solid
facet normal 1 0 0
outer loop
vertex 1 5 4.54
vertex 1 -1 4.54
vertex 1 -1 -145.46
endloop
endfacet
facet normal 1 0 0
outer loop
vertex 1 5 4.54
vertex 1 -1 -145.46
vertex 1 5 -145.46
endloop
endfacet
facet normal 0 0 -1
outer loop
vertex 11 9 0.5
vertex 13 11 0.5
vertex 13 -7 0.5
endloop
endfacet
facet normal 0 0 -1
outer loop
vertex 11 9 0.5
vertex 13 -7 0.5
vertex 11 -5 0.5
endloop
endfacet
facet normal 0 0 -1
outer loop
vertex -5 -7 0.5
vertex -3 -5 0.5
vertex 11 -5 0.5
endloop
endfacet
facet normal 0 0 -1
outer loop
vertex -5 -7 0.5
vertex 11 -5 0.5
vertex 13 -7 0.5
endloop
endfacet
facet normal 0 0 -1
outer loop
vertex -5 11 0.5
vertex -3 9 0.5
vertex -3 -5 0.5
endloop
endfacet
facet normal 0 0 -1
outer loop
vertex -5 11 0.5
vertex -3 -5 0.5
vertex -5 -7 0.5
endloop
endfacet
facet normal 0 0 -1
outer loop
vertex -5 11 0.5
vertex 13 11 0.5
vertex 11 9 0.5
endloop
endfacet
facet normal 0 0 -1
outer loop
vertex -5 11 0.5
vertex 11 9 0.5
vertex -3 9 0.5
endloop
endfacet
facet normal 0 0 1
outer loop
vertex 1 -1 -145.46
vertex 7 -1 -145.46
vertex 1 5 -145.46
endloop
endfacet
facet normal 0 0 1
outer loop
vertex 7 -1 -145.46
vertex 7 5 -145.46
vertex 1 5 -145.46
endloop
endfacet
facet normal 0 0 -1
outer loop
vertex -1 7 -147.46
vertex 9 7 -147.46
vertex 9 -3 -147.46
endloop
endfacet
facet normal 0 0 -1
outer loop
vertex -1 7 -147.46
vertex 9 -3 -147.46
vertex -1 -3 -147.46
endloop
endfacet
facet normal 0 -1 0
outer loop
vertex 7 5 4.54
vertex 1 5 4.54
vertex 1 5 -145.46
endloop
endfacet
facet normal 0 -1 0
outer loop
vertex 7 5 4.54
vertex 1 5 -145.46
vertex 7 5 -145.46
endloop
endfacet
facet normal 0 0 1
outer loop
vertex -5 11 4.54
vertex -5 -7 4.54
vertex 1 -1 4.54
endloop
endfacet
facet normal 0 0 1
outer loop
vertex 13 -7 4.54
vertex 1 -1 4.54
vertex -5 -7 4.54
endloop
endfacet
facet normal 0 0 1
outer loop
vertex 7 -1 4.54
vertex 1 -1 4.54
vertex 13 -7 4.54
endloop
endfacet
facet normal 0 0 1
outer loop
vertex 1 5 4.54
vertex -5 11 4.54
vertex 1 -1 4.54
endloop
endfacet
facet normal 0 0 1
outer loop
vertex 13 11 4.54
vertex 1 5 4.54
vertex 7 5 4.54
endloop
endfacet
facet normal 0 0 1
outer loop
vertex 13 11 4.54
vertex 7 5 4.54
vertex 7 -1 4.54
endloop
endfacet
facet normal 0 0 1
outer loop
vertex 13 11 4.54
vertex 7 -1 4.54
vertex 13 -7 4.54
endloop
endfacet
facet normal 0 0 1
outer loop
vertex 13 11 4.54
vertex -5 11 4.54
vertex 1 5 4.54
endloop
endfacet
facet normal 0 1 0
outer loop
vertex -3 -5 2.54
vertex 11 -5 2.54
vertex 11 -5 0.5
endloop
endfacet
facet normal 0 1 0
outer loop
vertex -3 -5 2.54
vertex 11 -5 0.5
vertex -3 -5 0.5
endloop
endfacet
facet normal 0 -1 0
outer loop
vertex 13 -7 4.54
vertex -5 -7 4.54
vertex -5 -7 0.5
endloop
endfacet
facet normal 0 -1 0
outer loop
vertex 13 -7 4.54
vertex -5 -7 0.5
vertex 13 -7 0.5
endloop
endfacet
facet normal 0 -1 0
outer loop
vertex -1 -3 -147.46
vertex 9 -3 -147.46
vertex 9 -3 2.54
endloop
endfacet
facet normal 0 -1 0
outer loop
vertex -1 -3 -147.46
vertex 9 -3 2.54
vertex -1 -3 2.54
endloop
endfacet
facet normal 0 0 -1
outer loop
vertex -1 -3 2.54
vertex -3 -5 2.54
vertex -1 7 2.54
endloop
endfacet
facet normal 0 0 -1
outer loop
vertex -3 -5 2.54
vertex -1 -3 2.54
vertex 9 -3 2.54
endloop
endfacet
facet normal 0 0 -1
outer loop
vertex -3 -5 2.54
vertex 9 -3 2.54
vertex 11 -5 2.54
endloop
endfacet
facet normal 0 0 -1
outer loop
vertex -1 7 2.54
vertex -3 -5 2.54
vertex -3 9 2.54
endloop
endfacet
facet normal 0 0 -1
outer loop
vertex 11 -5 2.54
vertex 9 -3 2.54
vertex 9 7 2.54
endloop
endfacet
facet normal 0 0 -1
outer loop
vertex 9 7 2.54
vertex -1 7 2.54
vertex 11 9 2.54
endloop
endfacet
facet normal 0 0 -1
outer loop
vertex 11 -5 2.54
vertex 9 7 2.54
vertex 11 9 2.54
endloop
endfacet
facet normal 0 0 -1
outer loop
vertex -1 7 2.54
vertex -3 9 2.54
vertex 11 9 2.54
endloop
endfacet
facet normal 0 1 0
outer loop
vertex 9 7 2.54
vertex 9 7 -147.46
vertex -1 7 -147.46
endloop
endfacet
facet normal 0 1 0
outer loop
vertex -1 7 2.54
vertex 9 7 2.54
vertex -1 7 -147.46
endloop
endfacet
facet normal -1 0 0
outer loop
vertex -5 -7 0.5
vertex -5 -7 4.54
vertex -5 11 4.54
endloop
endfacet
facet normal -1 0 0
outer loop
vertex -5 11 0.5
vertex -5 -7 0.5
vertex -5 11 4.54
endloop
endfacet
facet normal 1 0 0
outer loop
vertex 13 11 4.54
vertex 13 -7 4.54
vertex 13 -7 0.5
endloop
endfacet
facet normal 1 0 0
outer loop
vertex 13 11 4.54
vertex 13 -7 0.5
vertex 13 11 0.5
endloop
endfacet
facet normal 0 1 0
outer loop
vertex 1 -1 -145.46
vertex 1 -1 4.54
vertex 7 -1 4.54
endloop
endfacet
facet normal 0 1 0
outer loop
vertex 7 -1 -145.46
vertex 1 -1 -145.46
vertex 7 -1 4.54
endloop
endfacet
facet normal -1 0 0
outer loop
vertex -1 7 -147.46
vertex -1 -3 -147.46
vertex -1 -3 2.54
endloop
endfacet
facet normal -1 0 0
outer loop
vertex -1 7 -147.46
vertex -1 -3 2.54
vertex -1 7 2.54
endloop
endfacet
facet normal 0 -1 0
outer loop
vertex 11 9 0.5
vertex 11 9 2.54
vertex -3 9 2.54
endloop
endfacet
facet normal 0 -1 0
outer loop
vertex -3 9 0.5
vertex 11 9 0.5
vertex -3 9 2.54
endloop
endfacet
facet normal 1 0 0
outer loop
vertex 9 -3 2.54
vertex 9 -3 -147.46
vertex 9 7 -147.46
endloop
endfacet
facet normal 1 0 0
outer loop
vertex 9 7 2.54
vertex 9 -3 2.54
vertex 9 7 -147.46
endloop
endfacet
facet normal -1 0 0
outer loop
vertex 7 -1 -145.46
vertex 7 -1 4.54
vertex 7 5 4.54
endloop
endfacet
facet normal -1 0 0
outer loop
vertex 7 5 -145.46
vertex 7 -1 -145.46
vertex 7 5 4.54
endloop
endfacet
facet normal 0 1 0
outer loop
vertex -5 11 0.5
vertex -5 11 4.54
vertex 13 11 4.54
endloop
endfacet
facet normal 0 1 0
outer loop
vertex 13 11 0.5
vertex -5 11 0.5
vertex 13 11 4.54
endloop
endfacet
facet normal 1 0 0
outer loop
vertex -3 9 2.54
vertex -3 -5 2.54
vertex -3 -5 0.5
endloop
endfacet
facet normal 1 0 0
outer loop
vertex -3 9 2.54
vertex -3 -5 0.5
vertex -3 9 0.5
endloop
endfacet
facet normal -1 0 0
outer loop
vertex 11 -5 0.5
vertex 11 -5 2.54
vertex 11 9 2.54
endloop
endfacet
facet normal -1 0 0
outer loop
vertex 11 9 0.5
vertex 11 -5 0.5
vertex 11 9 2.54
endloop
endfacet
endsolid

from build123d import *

# Parameters (mm, degrees)
SKETCH1_W            = 10
SKETCH1_H            = 10
SKETCH1_W_2          = 6
SKETCH1_H_2          = 6
BOSS_EXTRUDE1_DEPTH  = 2.54
BOSS_EXTRUDE4_DEPTH  = 2.54
CUT_EXTRUDE4_DEPTH   = 2.54
BOSS_EXTRUDE6_DEPTH  = 2.54
BOSS_EXTRUDE7_DEPTH  = 2.54
SKETCH8_W            = 16
SKETCH8_H            = 16
SKETCH8_W_2          = 12
SKETCH8_H_2          = 12
CUT_EXTRUDE5_DEPTH   = 0.5
SKETCH9_W            = 8
SKETCH9_H            = 8
BOSS_EXTRUDE8_DEPTH  = 0.5
SKETCH10_W           = 12
SKETCH10_H           = 12
SKETCH10_W_2         = 8
SKETCH10_H_2         = 8
CUT_EXTRUDE6_DEPTH   = 10
SKETCH11_W           = 16
SKETCH11_H           = 16
SKETCH11_W_2         = 8
SKETCH11_H_2         = 8
BOSS_EXTRUDE9_DEPTH  = 2
SKETCH13_W           = 8
SKETCH13_H           = 8
CUT_EXTRUDE7_DEPTH   = 2
SKETCH14_W           = 10
SKETCH14_H           = 10
SKETCH14_W_2         = 6
SKETCH14_H_2         = 6
CUT_EXTRUDE8_DEPTH   = 2
SKETCH16_W           = 14
SKETCH16_H           = 14
SKETCH16_W_2         = 12
SKETCH16_H_2         = 12
CUT_EXTRUDE12_DEPTH  = 10
SKETCH17_W           = 18
SKETCH17_H           = 18
SKETCH17_W_2         = 16
SKETCH17_H_2         = 16
BOSS_EXTRUDE10_DEPTH = 4
SKETCH18_W           = 18
SKETCH18_H           = 18
SKETCH18_W_2         = 16
SKETCH18_H_2         = 16
BOSS_EXTRUDE11_DEPTH = 1
SKETCH19_W           = 10
SKETCH19_H           = 10
SKETCH19_W_2         = 6
SKETCH19_H_2         = 6
BOSS_EXTRUDE12_DEPTH = 150
SKETCH20_W           = 10
SKETCH20_H           = 10
BOSS_EXTRUDE13_DEPTH = 2


with BuildPart() as part:
    # Sketch1 → Boss-Extrude1 (new body)
    with BuildSketch(Plane.XY):
        with Locations((3, 3)):
            Rectangle(SKETCH1_W, SKETCH1_H)
        with Locations((3, 3)):
            Rectangle(SKETCH1_W_2, SKETCH1_H_2, mode=Mode.SUBTRACT)
    extrude(amount=BOSS_EXTRUDE1_DEPTH)

    # Sketch2 → Boss-Extrude4 (add)
    with BuildSketch(Plane(origin=(0, 0, 0), x_dir=(-1, 0, 0), z_dir=(0, 0, -1))):
        Polygon((-8, 8), (-8, -2), (2, -2), (2, -4), (-10, -4), (-10, 8), align=None)
    extrude(amount=-BOSS_EXTRUDE4_DEPTH)

    # Sketch5 → Cut-Extrude4 (cut)
    with BuildSketch(Plane(origin=(0, 0, 0), x_dir=(-1, 0, 0), z_dir=(0, 0, -1))):
        Polygon((-6, 6), (-6, 0), (0, 0), (0, -2), (-8, -2), (-8, 6), align=None)
    extrude(amount=-CUT_EXTRUDE4_DEPTH, mode=Mode.SUBTRACT)

    # Sketch6 → Boss-Extrude6 (add)
    with BuildSketch(Plane(origin=(0, 0, 0), x_dir=(-1, 0, 0), z_dir=(0, 0, -1))):
        Polygon((-10, 8), (-10, -4), (2, -4), (2, -6), (-12, -6), (-12, 8), align=None)
    extrude(amount=-BOSS_EXTRUDE6_DEPTH)

    # Sketch7 → Boss-Extrude7 (add)
    with BuildSketch(Plane(origin=(0, 0, 0), x_dir=(-1, 0, 0), z_dir=(0, 0, -1))):
        Polygon((-12, 8), (2, 8), (2, -6), (4, -6), (4, 10), (-12, 10), align=None)
    extrude(amount=-BOSS_EXTRUDE7_DEPTH)

    # Sketch8 → Cut-Extrude5 (cut)
    with BuildSketch(Plane(origin=(0, 0, 0), x_dir=(-1, 0, 0), z_dir=(0, 0, -1))):
        with Locations((-4, 2)):
            Rectangle(SKETCH8_W, SKETCH8_H)
        with Locations((-4, 2)):
            Rectangle(SKETCH8_W_2, SKETCH8_H_2, mode=Mode.SUBTRACT)
    extrude(amount=-CUT_EXTRUDE5_DEPTH, mode=Mode.SUBTRACT)

    # Sketch10 → Cut-Extrude6 (cut)
    with BuildSketch(Plane(origin=(0, 0, 0), x_dir=(-1, 0, 0), z_dir=(0, 0, -1))):
        with Locations((-4, 2)):
            Rectangle(SKETCH10_W, SKETCH10_H)
        with Locations((-4, 2)):
            Rectangle(SKETCH10_W_2, SKETCH10_H_2, mode=Mode.SUBTRACT)
    extrude(amount=-CUT_EXTRUDE6_DEPTH, mode=Mode.SUBTRACT)

    # Sketch11 → Boss-Extrude9 (add)
    with BuildSketch(Plane.XY.offset(2.54)):
        with Locations((4, 2)):
            Rectangle(SKETCH11_W, SKETCH11_H)
        with Locations((4, 2)):
            Rectangle(SKETCH11_W_2, SKETCH11_H_2, mode=Mode.SUBTRACT)
    extrude(amount=BOSS_EXTRUDE9_DEPTH)

    # Sketch14 → Cut-Extrude8 (cut)
    with BuildSketch(Plane(origin=(0, 0, 2.54), x_dir=(-1, 0, 0), z_dir=(0, 0, -1))):
        with Locations((-4, 2)):
            Rectangle(SKETCH14_W, SKETCH14_H)
        with Locations((-4, 2)):
            Rectangle(SKETCH14_W_2, SKETCH14_H_2, mode=Mode.SUBTRACT)
    extrude(amount=-CUT_EXTRUDE8_DEPTH, mode=Mode.SUBTRACT)

    # Sketch16 → Cut-Extrude12 (cut)
    with BuildSketch(Plane(origin=(0, 0, 2.54), x_dir=(-1, 0, 0), z_dir=(0, 0, -1))):
        with Locations((-4, 2)):
            Rectangle(SKETCH16_W, SKETCH16_H)
        with Locations((-4, 2)):
            Rectangle(SKETCH16_W_2, SKETCH16_H_2, mode=Mode.SUBTRACT)
    extrude(amount=CUT_EXTRUDE12_DEPTH, mode=Mode.SUBTRACT)

    # Sketch17 → Boss-Extrude10 (add)
    with BuildSketch(Plane(origin=(0, 0, 0.5), x_dir=(-1, 0, 0), z_dir=(0, 0, -1))):
        with Locations((-4, 2)):
            Rectangle(SKETCH17_W, SKETCH17_H)
        with Locations((-4, 2)):
            Rectangle(SKETCH17_W_2, SKETCH17_H_2, mode=Mode.SUBTRACT)
    extrude(amount=-BOSS_EXTRUDE10_DEPTH)

    # Sketch18 → Boss-Extrude11 (add)
    with BuildSketch(Plane.XY.offset(4.54)):
        with Locations((4, 2)):
            Rectangle(SKETCH18_W, SKETCH18_H)
        with Locations((4, 2)):
            Rectangle(SKETCH18_W_2, SKETCH18_H_2, mode=Mode.SUBTRACT)
    extrude(amount=-BOSS_EXTRUDE11_DEPTH)

    # Sketch19 → Boss-Extrude12 (add)
    with BuildSketch(Plane.XY.offset(4.54)):
        with Locations((4, 2)):
            Rectangle(SKETCH19_W, SKETCH19_H)
        with Locations((4, 2)):
            Rectangle(SKETCH19_W_2, SKETCH19_H_2, mode=Mode.SUBTRACT)
    extrude(amount=-BOSS_EXTRUDE12_DEPTH)

    # Sketch20 → Boss-Extrude13 (add)
    with BuildSketch(Plane(origin=(0, 0, -145.46), x_dir=(-1, 0, 0), z_dir=(0, 0, -1))):
        with Locations((-4, 2)):
            Rectangle(SKETCH20_W, SKETCH20_H)
    extrude(amount=BOSS_EXTRUDE13_DEPTH)


with BuildPart() as body_2:
    # Sketch9 → Boss-Extrude8 (new body)
    with BuildSketch(Plane(origin=(0, 0, 0), x_dir=(-1, 0, 0), z_dir=(0, 0, -1))):
        with Locations((-4, 2)):
            Rectangle(SKETCH9_W, SKETCH9_H)
    extrude(amount=BOSS_EXTRUDE8_DEPTH)

    # Sketch13 → Cut-Extrude7 (cut)
    with BuildSketch(Plane(origin=(0, 0, -0.5), x_dir=(-1, 0, 0), z_dir=(0, 0, -1))):
        with Locations((-4, 2)):
            Rectangle(SKETCH13_W, SKETCH13_H)
    extrude(amount=-CUT_EXTRUDE7_DEPTH, mode=Mode.SUBTRACT)


solid = part.part
